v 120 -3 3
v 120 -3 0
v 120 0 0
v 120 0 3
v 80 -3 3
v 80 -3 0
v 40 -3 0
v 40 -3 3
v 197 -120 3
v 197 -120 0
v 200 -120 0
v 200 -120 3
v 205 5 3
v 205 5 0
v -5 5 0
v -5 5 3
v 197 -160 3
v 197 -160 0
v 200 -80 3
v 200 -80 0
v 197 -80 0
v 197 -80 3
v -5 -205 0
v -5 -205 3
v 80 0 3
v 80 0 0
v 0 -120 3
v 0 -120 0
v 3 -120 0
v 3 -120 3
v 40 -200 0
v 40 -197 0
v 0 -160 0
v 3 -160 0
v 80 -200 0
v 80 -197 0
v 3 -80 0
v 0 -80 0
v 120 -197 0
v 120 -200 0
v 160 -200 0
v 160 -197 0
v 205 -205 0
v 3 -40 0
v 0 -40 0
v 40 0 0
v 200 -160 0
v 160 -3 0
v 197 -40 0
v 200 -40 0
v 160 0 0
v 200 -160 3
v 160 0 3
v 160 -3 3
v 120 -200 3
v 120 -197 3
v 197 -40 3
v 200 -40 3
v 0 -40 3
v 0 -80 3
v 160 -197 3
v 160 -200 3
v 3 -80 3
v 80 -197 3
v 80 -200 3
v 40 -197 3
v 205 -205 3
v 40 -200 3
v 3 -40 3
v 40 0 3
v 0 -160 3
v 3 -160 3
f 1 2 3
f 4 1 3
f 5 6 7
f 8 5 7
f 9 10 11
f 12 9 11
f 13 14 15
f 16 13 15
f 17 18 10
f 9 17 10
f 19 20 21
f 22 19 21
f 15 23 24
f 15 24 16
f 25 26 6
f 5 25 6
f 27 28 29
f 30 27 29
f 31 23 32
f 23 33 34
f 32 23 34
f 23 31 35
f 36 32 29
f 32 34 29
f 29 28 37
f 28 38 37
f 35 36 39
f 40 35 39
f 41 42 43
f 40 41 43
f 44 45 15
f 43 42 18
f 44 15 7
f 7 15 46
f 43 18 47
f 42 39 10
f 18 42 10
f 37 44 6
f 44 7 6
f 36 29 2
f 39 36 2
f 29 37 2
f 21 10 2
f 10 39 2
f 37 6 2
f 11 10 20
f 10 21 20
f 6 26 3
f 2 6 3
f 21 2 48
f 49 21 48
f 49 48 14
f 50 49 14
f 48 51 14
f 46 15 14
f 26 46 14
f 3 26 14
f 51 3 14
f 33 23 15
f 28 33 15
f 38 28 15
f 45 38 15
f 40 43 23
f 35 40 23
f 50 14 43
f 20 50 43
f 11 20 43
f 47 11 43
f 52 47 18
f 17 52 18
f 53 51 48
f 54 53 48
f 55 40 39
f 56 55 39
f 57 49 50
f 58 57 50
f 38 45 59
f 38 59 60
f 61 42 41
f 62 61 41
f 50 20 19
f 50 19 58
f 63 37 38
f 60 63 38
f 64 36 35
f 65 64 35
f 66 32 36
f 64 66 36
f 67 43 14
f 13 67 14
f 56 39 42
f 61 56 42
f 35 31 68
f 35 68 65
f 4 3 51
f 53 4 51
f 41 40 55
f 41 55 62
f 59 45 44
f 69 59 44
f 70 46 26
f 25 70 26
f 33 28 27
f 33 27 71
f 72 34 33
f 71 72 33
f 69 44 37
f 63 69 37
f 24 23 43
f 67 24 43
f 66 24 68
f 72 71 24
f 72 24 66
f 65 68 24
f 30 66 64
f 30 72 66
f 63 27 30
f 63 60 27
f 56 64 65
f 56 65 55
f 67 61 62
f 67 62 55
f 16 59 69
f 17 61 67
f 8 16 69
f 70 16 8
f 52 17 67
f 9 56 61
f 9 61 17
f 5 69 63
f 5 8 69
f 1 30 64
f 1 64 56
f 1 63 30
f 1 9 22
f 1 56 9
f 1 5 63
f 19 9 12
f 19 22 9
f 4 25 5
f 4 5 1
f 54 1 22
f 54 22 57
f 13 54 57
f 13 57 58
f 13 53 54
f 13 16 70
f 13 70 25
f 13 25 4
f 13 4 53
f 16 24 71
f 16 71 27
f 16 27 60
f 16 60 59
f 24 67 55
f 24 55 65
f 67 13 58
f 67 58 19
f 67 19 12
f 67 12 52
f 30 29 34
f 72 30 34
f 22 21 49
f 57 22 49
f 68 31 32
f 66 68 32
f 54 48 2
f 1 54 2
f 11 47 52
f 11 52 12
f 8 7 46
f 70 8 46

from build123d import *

# Parameters (mm, degrees)
SKETCH_1_W      = 200
SKETCH_1_H      = 5
EXTRUDE_1_DEPTH = 3


with BuildPart() as part:
    # 草图1 → 凸台-拉伸1 (new body)
    with BuildSketch(Plane.XY):
        Polygon((0, -80), (0, -100), (100, -100), (100, 0), (80, 0), (80, -3), (40, -3), (40, 0), (0, 0), (0, -40), (3, -40), (3, -80), align=None)
        Polygon((100, -100), (0, -100), (0, -120), (3, -120), (3, -160), (0, -160), (0, -200), (40, -200), (40, -197), (80, -197), (80, -200), (100, -200), align=None)
        Polygon((100, 0), (100, -100), (200, -100), (200, -80), (197, -80), (197, -40), (200, -40), (200, 0), (160, 0), (160, -3), (120, -3), (120, 0), align=None)
        Polygon((200, -100), (100, -100), (100, -200), (120, -200), (120, -197), (160, -197), (160, -200), (200, -200), (200, -160), (197, -160), (197, -120), (200, -120), align=None)
        Polygon((-5, -205), (-5, 5), (0, 5), (0, 0), (0, -200), (0, -205), align=None)
        with Locations((100, 2.5)):
            Rectangle(SKETCH_1_W, SKETCH_1_H)
        Polygon((205, 5), (205, -200), (200, -200), (200, 0), (200, 5), align=None)
        Polygon((0, -200), (200, -200), (205, -200), (205, -205), (0, -205), align=None)
    extrude(amount=EXTRUDE_1_DEPTH)


solid = part.part
